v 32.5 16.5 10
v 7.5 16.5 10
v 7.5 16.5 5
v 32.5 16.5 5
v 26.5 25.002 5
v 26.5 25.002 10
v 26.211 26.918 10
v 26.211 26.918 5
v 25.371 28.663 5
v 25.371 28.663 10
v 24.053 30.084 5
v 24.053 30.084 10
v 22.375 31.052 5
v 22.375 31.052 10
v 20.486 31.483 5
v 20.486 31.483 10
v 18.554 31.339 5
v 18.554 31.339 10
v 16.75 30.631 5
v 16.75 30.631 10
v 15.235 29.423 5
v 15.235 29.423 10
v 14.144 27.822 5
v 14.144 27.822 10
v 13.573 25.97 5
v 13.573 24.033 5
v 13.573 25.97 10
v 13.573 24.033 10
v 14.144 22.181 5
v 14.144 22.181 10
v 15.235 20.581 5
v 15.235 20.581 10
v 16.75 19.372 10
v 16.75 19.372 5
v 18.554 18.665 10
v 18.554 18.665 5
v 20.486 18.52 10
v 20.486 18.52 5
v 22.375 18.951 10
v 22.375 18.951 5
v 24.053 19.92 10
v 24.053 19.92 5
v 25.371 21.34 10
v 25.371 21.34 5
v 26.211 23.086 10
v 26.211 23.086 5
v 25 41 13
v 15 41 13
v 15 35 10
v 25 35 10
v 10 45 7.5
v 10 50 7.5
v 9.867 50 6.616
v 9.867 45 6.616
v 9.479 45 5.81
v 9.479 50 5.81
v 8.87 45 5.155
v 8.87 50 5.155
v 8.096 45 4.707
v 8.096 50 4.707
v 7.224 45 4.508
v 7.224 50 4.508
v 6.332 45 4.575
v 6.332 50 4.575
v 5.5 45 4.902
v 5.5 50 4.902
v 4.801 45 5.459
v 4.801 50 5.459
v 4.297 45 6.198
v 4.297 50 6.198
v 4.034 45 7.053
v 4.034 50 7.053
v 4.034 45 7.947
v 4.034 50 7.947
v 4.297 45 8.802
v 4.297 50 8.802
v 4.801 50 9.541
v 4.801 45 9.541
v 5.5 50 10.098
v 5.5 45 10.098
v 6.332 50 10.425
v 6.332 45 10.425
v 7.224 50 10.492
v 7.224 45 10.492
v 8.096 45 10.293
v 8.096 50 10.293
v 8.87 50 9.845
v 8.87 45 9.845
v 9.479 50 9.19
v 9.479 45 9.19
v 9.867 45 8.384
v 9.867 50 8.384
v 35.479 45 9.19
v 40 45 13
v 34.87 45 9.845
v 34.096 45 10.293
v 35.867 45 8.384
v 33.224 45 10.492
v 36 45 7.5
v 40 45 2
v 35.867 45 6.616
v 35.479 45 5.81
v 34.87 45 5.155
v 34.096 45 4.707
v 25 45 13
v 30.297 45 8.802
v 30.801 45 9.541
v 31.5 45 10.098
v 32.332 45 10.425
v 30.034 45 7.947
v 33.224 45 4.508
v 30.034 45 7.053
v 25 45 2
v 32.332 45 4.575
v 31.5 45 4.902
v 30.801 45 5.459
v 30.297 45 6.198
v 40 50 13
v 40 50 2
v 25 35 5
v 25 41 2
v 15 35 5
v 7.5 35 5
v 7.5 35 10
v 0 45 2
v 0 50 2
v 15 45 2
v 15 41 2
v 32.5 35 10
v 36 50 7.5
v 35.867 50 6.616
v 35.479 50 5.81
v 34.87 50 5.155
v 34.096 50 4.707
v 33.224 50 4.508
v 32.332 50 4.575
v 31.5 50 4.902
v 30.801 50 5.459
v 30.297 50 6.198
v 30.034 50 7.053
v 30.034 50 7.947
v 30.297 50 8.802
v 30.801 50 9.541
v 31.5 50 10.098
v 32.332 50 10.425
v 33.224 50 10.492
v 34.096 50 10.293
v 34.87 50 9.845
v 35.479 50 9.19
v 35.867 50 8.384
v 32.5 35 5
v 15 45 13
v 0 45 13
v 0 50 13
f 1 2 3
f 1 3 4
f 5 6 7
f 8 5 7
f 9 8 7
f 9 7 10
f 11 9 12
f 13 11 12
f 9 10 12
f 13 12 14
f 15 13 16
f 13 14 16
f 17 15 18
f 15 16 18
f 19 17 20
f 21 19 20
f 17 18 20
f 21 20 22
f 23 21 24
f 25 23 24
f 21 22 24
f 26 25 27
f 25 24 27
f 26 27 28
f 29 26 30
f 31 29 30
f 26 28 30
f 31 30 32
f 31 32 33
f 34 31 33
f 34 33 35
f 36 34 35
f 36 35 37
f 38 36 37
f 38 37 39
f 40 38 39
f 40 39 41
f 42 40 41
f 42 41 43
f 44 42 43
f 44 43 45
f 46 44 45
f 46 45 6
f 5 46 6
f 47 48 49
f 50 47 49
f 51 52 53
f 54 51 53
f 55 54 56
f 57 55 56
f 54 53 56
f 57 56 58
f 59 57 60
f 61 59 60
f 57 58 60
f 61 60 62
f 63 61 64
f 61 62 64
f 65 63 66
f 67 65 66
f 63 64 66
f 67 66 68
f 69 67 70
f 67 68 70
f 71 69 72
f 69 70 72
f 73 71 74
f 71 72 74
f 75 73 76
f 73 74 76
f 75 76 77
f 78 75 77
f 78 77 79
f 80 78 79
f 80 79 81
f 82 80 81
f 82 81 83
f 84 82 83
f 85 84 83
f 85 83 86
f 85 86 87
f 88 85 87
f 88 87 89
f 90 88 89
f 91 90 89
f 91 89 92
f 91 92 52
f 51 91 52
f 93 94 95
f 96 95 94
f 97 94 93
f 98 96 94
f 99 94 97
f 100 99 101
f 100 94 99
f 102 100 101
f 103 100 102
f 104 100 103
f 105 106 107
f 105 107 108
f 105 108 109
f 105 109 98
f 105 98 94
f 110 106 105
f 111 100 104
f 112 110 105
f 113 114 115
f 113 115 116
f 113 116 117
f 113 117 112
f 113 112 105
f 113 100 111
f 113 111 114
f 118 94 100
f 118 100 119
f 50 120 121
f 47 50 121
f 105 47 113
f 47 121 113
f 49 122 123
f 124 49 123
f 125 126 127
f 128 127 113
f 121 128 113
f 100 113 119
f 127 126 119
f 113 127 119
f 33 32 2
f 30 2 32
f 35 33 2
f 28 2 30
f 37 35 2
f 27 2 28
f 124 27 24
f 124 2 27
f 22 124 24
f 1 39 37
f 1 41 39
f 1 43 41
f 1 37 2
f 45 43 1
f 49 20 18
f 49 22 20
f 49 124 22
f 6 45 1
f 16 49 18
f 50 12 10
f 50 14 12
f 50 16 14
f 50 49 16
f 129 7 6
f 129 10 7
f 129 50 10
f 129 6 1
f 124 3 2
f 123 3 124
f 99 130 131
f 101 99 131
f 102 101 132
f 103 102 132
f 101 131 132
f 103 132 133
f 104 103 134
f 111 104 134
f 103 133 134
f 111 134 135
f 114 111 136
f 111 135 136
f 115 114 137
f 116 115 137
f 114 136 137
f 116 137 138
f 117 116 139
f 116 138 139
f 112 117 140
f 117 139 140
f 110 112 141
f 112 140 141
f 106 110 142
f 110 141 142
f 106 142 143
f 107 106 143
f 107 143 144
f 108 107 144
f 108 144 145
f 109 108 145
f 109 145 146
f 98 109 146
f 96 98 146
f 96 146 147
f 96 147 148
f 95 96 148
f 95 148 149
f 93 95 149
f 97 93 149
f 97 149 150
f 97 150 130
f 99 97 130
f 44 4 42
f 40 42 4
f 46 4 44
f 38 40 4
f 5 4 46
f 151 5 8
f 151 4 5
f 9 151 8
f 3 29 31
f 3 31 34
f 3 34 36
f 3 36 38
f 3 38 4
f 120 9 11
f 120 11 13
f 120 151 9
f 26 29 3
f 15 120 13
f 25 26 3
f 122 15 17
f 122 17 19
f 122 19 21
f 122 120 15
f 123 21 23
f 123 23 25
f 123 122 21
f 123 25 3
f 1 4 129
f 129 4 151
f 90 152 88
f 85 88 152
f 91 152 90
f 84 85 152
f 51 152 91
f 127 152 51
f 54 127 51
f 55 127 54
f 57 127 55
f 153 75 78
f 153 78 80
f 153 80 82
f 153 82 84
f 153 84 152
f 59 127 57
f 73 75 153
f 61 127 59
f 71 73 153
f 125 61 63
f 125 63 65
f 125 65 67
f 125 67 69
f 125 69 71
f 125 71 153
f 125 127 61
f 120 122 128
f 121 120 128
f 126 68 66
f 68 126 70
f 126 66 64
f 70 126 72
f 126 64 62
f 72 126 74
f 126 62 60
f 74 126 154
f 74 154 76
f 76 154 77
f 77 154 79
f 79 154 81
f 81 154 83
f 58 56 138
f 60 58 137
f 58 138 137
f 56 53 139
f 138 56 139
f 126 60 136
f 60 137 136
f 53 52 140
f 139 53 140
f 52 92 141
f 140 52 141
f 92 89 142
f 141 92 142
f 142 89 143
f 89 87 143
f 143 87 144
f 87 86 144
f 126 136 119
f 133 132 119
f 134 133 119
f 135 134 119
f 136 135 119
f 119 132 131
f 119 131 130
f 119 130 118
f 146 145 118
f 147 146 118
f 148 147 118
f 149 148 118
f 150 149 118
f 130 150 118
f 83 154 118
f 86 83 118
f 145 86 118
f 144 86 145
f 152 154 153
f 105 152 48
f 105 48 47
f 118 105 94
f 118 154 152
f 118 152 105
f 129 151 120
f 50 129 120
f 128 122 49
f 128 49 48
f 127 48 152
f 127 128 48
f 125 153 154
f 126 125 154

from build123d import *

# Parameters (mm, degrees)
SKETCH1_W                = 40
SKETCH1_H                = 50
BOSS_EXTRUDE1_DEPTH      = 15
BOSS_EXTRUDE1_DEPTH_BACK = 0.0001
SKETCH2_R                = 6.5
CUT_EXTRUDE1_DEPTH       = 30
SKETCH3_W                = 15
SKETCH3_H                = 10
CUT_EXTRUDE4_DEPTH       = 30
SKETCH5_R                = 3
CUT_EXTRUDE5_DEPTH       = 10
SKETCH6_W                = 40
SKETCH6_H                = 35
CUT_EXTRUDE7_DEPTH       = 3.5
SKETCH7_W                = 40
SKETCH7_H                = 35
CUT_EXTRUDE8_DEPTH       = 3.5
CUT_EXTRUDE9_DEPTH       = 15
SKETCH10_R               = 6.5
CUT_EXTRUDE11_DEPTH      = 10
SKETCH11_W               = 40
SKETCH11_H               = 16.5
CUT_EXTRUDE16_DEPTH      = 10
SKETCH12_W               = 40
SKETCH12_H               = 18.5
CUT_EXTRUDE17_DEPTH      = 1.5
SKETCH13_W               = 40
SKETCH13_H               = 18.5
CUT_EXTRUDE18_DEPTH      = 1.5
CUT_EXTRUDE19_DEPTH      = 150
SKETCH15_W               = 40
SKETCH15_H               = 2
CUT_EXTRUDE21_DEPTH      = 10
SKETCH16_W               = 40
SKETCH16_H               = 5
CUT_EXTRUDE22_DEPTH      = 1
SKETCH17_W               = 7.5
SKETCH17_H               = 18.5
CUT_EXTRUDE23_DEPTH      = 10


with BuildPart() as part:
    # Sketch1 → Boss-Extrude1 (new body, two sides)
    with BuildSketch(Plane.XY) as boss_extrude1_sk:
        with Locations((20, 25)):
            Rectangle(SKETCH1_W, SKETCH1_H)
    extrude(amount=BOSS_EXTRUDE1_DEPTH)
    extrude(boss_extrude1_sk.sketch, amount=-BOSS_EXTRUDE1_DEPTH_BACK)

    # Sketch2 → Cut-Extrude1 (cut)
    with BuildSketch(Plane.XY.offset(15)):
        with Locations((20, 10)):
            Circle(SKETCH2_R)
    extrude(amount=-CUT_EXTRUDE1_DEPTH, mode=Mode.SUBTRACT)

    # Sketch3 → Cut-Extrude4 (cut)
    with BuildSketch(Plane(origin=(0, 0, -0.0001), x_dir=(-1, 0, 0), z_dir=(0, 0, -1))):
        with Locations((-32.5, 40)):
            Rectangle(SKETCH3_W, SKETCH3_H)
        with Locations((-7.5, 40)):
            Rectangle(SKETCH3_W, SKETCH3_H)
    extrude(amount=-CUT_EXTRUDE4_DEPTH, mode=Mode.SUBTRACT)

    # Sketch5 → Cut-Extrude5 (cut)
    with BuildSketch(Plane(origin=(0, 50, 0), x_dir=(1, 0, 0), z_dir=(0, 1, 0))):
        with Locations((7, -7.5)):
            Circle(SKETCH5_R)
        with Locations((33, -7.5)):
            Circle(SKETCH5_R)
    extrude(amount=-CUT_EXTRUDE5_DEPTH, mode=Mode.SUBTRACT)

    # Sketch6 → Cut-Extrude7 (cut)
    with BuildSketch(Plane.XY.offset(15)):
        with Locations((20, 17.5)):
            Rectangle(SKETCH6_W, SKETCH6_H)
    extrude(amount=-CUT_EXTRUDE7_DEPTH, mode=Mode.SUBTRACT)

    # Sketch7 → Cut-Extrude8 (cut)
    with BuildSketch(Plane(origin=(0, 0, -0.0001), x_dir=(-1, 0, 0), z_dir=(0, 0, -1))):
        with Locations((-20, 17.5)):
            Rectangle(SKETCH7_W, SKETCH7_H)
    extrude(amount=-CUT_EXTRUDE8_DEPTH, mode=Mode.SUBTRACT)

    # Sketch8 → Cut-Extrude9 (cut)
    with BuildSketch(Plane.ZY.offset(-15)):
        Polygon((-0.0001, 35), (3.4999, 35), (-0.0001, 45), align=None)
        Polygon((11.5, 35), (15, 35), (15, 45), align=None)
    extrude(amount=-CUT_EXTRUDE9_DEPTH, mode=Mode.SUBTRACT)

    # Sketch10 → Cut-Extrude11 (cut)
    with BuildSketch(Plane.XY.offset(11.5)):
        with Locations((20, 25.001654813)):
            Circle(SKETCH10_R)
    extrude(amount=-CUT_EXTRUDE11_DEPTH, mode=Mode.SUBTRACT)

    # Sketch11 → Cut-Extrude16 (cut)
    with BuildSketch(Plane.XY.offset(11.5)):
        with Locations((20, 8.25)):
            Rectangle(SKETCH11_W, SKETCH11_H)
    extrude(amount=-CUT_EXTRUDE16_DEPTH, mode=Mode.SUBTRACT)

    # Sketch12 → Cut-Extrude17 (cut)
    with BuildSketch(Plane.XY.offset(11.5)):
        with Locations((20, 25.75)):
            Rectangle(SKETCH12_W, SKETCH12_H)
    extrude(amount=-CUT_EXTRUDE17_DEPTH, mode=Mode.SUBTRACT)

    # Sketch13 → Cut-Extrude18 (cut)
    with BuildSketch(Plane(origin=(0, 0, 3.4999), x_dir=(-1, 0, 0), z_dir=(0, 0, -1))):
        with Locations((-20, 25.75)):
            Rectangle(SKETCH13_W, SKETCH13_H)
    extrude(amount=-CUT_EXTRUDE18_DEPTH, mode=Mode.SUBTRACT)

    # Sketch14 → Cut-Extrude19 (cut)
    with BuildSketch(Plane.ZY.offset(-15)):
        Polygon((4.9999, 35), (-0.0001, 45), (3.4999, 35), align=None)
        Polygon((10, 35), (11.5, 35), (15, 45), align=None)
    extrude(amount=-CUT_EXTRUDE19_DEPTH, mode=Mode.SUBTRACT)

    # Sketch15 → Cut-Extrude21 (cut)
    with BuildSketch(Plane(origin=(0, 50, 0), x_dir=(1, 0, 0), z_dir=(0, 1, 0))):
        Polygon((0, 0), (0, -2), (40, -2), (40, 0.0001), align=None)
        with Locations((20, -14)):
            Rectangle(SKETCH15_W, SKETCH15_H)
    extrude(amount=-CUT_EXTRUDE21_DEPTH, mode=Mode.SUBTRACT)

    # Sketch16 → Cut-Extrude22 (cut)
    with BuildSketch(Plane(origin=(0, 0, -0.0001), x_dir=(-1, 0, 0), z_dir=(0, 0, -1))):
        with Locations((-20, 47.5)):
            Rectangle(SKETCH16_W, SKETCH16_H)
    extrude(amount=-CUT_EXTRUDE22_DEPTH, mode=Mode.SUBTRACT)

    # Sketch17 → Cut-Extrude23 (cut)
    with BuildSketch(Plane(origin=(0, 0, 4.9999), x_dir=(-1, 0, 0), z_dir=(0, 0, -1))):
        with Locations((-36.25, 25.75)):
            Rectangle(SKETCH17_W, SKETCH17_H)
        with Locations((-3.75, 25.75)):
            Rectangle(SKETCH17_W, SKETCH17_H)
    extrude(amount=-CUT_EXTRUDE23_DEPTH, mode=Mode.SUBTRACT)


solid = part.part
